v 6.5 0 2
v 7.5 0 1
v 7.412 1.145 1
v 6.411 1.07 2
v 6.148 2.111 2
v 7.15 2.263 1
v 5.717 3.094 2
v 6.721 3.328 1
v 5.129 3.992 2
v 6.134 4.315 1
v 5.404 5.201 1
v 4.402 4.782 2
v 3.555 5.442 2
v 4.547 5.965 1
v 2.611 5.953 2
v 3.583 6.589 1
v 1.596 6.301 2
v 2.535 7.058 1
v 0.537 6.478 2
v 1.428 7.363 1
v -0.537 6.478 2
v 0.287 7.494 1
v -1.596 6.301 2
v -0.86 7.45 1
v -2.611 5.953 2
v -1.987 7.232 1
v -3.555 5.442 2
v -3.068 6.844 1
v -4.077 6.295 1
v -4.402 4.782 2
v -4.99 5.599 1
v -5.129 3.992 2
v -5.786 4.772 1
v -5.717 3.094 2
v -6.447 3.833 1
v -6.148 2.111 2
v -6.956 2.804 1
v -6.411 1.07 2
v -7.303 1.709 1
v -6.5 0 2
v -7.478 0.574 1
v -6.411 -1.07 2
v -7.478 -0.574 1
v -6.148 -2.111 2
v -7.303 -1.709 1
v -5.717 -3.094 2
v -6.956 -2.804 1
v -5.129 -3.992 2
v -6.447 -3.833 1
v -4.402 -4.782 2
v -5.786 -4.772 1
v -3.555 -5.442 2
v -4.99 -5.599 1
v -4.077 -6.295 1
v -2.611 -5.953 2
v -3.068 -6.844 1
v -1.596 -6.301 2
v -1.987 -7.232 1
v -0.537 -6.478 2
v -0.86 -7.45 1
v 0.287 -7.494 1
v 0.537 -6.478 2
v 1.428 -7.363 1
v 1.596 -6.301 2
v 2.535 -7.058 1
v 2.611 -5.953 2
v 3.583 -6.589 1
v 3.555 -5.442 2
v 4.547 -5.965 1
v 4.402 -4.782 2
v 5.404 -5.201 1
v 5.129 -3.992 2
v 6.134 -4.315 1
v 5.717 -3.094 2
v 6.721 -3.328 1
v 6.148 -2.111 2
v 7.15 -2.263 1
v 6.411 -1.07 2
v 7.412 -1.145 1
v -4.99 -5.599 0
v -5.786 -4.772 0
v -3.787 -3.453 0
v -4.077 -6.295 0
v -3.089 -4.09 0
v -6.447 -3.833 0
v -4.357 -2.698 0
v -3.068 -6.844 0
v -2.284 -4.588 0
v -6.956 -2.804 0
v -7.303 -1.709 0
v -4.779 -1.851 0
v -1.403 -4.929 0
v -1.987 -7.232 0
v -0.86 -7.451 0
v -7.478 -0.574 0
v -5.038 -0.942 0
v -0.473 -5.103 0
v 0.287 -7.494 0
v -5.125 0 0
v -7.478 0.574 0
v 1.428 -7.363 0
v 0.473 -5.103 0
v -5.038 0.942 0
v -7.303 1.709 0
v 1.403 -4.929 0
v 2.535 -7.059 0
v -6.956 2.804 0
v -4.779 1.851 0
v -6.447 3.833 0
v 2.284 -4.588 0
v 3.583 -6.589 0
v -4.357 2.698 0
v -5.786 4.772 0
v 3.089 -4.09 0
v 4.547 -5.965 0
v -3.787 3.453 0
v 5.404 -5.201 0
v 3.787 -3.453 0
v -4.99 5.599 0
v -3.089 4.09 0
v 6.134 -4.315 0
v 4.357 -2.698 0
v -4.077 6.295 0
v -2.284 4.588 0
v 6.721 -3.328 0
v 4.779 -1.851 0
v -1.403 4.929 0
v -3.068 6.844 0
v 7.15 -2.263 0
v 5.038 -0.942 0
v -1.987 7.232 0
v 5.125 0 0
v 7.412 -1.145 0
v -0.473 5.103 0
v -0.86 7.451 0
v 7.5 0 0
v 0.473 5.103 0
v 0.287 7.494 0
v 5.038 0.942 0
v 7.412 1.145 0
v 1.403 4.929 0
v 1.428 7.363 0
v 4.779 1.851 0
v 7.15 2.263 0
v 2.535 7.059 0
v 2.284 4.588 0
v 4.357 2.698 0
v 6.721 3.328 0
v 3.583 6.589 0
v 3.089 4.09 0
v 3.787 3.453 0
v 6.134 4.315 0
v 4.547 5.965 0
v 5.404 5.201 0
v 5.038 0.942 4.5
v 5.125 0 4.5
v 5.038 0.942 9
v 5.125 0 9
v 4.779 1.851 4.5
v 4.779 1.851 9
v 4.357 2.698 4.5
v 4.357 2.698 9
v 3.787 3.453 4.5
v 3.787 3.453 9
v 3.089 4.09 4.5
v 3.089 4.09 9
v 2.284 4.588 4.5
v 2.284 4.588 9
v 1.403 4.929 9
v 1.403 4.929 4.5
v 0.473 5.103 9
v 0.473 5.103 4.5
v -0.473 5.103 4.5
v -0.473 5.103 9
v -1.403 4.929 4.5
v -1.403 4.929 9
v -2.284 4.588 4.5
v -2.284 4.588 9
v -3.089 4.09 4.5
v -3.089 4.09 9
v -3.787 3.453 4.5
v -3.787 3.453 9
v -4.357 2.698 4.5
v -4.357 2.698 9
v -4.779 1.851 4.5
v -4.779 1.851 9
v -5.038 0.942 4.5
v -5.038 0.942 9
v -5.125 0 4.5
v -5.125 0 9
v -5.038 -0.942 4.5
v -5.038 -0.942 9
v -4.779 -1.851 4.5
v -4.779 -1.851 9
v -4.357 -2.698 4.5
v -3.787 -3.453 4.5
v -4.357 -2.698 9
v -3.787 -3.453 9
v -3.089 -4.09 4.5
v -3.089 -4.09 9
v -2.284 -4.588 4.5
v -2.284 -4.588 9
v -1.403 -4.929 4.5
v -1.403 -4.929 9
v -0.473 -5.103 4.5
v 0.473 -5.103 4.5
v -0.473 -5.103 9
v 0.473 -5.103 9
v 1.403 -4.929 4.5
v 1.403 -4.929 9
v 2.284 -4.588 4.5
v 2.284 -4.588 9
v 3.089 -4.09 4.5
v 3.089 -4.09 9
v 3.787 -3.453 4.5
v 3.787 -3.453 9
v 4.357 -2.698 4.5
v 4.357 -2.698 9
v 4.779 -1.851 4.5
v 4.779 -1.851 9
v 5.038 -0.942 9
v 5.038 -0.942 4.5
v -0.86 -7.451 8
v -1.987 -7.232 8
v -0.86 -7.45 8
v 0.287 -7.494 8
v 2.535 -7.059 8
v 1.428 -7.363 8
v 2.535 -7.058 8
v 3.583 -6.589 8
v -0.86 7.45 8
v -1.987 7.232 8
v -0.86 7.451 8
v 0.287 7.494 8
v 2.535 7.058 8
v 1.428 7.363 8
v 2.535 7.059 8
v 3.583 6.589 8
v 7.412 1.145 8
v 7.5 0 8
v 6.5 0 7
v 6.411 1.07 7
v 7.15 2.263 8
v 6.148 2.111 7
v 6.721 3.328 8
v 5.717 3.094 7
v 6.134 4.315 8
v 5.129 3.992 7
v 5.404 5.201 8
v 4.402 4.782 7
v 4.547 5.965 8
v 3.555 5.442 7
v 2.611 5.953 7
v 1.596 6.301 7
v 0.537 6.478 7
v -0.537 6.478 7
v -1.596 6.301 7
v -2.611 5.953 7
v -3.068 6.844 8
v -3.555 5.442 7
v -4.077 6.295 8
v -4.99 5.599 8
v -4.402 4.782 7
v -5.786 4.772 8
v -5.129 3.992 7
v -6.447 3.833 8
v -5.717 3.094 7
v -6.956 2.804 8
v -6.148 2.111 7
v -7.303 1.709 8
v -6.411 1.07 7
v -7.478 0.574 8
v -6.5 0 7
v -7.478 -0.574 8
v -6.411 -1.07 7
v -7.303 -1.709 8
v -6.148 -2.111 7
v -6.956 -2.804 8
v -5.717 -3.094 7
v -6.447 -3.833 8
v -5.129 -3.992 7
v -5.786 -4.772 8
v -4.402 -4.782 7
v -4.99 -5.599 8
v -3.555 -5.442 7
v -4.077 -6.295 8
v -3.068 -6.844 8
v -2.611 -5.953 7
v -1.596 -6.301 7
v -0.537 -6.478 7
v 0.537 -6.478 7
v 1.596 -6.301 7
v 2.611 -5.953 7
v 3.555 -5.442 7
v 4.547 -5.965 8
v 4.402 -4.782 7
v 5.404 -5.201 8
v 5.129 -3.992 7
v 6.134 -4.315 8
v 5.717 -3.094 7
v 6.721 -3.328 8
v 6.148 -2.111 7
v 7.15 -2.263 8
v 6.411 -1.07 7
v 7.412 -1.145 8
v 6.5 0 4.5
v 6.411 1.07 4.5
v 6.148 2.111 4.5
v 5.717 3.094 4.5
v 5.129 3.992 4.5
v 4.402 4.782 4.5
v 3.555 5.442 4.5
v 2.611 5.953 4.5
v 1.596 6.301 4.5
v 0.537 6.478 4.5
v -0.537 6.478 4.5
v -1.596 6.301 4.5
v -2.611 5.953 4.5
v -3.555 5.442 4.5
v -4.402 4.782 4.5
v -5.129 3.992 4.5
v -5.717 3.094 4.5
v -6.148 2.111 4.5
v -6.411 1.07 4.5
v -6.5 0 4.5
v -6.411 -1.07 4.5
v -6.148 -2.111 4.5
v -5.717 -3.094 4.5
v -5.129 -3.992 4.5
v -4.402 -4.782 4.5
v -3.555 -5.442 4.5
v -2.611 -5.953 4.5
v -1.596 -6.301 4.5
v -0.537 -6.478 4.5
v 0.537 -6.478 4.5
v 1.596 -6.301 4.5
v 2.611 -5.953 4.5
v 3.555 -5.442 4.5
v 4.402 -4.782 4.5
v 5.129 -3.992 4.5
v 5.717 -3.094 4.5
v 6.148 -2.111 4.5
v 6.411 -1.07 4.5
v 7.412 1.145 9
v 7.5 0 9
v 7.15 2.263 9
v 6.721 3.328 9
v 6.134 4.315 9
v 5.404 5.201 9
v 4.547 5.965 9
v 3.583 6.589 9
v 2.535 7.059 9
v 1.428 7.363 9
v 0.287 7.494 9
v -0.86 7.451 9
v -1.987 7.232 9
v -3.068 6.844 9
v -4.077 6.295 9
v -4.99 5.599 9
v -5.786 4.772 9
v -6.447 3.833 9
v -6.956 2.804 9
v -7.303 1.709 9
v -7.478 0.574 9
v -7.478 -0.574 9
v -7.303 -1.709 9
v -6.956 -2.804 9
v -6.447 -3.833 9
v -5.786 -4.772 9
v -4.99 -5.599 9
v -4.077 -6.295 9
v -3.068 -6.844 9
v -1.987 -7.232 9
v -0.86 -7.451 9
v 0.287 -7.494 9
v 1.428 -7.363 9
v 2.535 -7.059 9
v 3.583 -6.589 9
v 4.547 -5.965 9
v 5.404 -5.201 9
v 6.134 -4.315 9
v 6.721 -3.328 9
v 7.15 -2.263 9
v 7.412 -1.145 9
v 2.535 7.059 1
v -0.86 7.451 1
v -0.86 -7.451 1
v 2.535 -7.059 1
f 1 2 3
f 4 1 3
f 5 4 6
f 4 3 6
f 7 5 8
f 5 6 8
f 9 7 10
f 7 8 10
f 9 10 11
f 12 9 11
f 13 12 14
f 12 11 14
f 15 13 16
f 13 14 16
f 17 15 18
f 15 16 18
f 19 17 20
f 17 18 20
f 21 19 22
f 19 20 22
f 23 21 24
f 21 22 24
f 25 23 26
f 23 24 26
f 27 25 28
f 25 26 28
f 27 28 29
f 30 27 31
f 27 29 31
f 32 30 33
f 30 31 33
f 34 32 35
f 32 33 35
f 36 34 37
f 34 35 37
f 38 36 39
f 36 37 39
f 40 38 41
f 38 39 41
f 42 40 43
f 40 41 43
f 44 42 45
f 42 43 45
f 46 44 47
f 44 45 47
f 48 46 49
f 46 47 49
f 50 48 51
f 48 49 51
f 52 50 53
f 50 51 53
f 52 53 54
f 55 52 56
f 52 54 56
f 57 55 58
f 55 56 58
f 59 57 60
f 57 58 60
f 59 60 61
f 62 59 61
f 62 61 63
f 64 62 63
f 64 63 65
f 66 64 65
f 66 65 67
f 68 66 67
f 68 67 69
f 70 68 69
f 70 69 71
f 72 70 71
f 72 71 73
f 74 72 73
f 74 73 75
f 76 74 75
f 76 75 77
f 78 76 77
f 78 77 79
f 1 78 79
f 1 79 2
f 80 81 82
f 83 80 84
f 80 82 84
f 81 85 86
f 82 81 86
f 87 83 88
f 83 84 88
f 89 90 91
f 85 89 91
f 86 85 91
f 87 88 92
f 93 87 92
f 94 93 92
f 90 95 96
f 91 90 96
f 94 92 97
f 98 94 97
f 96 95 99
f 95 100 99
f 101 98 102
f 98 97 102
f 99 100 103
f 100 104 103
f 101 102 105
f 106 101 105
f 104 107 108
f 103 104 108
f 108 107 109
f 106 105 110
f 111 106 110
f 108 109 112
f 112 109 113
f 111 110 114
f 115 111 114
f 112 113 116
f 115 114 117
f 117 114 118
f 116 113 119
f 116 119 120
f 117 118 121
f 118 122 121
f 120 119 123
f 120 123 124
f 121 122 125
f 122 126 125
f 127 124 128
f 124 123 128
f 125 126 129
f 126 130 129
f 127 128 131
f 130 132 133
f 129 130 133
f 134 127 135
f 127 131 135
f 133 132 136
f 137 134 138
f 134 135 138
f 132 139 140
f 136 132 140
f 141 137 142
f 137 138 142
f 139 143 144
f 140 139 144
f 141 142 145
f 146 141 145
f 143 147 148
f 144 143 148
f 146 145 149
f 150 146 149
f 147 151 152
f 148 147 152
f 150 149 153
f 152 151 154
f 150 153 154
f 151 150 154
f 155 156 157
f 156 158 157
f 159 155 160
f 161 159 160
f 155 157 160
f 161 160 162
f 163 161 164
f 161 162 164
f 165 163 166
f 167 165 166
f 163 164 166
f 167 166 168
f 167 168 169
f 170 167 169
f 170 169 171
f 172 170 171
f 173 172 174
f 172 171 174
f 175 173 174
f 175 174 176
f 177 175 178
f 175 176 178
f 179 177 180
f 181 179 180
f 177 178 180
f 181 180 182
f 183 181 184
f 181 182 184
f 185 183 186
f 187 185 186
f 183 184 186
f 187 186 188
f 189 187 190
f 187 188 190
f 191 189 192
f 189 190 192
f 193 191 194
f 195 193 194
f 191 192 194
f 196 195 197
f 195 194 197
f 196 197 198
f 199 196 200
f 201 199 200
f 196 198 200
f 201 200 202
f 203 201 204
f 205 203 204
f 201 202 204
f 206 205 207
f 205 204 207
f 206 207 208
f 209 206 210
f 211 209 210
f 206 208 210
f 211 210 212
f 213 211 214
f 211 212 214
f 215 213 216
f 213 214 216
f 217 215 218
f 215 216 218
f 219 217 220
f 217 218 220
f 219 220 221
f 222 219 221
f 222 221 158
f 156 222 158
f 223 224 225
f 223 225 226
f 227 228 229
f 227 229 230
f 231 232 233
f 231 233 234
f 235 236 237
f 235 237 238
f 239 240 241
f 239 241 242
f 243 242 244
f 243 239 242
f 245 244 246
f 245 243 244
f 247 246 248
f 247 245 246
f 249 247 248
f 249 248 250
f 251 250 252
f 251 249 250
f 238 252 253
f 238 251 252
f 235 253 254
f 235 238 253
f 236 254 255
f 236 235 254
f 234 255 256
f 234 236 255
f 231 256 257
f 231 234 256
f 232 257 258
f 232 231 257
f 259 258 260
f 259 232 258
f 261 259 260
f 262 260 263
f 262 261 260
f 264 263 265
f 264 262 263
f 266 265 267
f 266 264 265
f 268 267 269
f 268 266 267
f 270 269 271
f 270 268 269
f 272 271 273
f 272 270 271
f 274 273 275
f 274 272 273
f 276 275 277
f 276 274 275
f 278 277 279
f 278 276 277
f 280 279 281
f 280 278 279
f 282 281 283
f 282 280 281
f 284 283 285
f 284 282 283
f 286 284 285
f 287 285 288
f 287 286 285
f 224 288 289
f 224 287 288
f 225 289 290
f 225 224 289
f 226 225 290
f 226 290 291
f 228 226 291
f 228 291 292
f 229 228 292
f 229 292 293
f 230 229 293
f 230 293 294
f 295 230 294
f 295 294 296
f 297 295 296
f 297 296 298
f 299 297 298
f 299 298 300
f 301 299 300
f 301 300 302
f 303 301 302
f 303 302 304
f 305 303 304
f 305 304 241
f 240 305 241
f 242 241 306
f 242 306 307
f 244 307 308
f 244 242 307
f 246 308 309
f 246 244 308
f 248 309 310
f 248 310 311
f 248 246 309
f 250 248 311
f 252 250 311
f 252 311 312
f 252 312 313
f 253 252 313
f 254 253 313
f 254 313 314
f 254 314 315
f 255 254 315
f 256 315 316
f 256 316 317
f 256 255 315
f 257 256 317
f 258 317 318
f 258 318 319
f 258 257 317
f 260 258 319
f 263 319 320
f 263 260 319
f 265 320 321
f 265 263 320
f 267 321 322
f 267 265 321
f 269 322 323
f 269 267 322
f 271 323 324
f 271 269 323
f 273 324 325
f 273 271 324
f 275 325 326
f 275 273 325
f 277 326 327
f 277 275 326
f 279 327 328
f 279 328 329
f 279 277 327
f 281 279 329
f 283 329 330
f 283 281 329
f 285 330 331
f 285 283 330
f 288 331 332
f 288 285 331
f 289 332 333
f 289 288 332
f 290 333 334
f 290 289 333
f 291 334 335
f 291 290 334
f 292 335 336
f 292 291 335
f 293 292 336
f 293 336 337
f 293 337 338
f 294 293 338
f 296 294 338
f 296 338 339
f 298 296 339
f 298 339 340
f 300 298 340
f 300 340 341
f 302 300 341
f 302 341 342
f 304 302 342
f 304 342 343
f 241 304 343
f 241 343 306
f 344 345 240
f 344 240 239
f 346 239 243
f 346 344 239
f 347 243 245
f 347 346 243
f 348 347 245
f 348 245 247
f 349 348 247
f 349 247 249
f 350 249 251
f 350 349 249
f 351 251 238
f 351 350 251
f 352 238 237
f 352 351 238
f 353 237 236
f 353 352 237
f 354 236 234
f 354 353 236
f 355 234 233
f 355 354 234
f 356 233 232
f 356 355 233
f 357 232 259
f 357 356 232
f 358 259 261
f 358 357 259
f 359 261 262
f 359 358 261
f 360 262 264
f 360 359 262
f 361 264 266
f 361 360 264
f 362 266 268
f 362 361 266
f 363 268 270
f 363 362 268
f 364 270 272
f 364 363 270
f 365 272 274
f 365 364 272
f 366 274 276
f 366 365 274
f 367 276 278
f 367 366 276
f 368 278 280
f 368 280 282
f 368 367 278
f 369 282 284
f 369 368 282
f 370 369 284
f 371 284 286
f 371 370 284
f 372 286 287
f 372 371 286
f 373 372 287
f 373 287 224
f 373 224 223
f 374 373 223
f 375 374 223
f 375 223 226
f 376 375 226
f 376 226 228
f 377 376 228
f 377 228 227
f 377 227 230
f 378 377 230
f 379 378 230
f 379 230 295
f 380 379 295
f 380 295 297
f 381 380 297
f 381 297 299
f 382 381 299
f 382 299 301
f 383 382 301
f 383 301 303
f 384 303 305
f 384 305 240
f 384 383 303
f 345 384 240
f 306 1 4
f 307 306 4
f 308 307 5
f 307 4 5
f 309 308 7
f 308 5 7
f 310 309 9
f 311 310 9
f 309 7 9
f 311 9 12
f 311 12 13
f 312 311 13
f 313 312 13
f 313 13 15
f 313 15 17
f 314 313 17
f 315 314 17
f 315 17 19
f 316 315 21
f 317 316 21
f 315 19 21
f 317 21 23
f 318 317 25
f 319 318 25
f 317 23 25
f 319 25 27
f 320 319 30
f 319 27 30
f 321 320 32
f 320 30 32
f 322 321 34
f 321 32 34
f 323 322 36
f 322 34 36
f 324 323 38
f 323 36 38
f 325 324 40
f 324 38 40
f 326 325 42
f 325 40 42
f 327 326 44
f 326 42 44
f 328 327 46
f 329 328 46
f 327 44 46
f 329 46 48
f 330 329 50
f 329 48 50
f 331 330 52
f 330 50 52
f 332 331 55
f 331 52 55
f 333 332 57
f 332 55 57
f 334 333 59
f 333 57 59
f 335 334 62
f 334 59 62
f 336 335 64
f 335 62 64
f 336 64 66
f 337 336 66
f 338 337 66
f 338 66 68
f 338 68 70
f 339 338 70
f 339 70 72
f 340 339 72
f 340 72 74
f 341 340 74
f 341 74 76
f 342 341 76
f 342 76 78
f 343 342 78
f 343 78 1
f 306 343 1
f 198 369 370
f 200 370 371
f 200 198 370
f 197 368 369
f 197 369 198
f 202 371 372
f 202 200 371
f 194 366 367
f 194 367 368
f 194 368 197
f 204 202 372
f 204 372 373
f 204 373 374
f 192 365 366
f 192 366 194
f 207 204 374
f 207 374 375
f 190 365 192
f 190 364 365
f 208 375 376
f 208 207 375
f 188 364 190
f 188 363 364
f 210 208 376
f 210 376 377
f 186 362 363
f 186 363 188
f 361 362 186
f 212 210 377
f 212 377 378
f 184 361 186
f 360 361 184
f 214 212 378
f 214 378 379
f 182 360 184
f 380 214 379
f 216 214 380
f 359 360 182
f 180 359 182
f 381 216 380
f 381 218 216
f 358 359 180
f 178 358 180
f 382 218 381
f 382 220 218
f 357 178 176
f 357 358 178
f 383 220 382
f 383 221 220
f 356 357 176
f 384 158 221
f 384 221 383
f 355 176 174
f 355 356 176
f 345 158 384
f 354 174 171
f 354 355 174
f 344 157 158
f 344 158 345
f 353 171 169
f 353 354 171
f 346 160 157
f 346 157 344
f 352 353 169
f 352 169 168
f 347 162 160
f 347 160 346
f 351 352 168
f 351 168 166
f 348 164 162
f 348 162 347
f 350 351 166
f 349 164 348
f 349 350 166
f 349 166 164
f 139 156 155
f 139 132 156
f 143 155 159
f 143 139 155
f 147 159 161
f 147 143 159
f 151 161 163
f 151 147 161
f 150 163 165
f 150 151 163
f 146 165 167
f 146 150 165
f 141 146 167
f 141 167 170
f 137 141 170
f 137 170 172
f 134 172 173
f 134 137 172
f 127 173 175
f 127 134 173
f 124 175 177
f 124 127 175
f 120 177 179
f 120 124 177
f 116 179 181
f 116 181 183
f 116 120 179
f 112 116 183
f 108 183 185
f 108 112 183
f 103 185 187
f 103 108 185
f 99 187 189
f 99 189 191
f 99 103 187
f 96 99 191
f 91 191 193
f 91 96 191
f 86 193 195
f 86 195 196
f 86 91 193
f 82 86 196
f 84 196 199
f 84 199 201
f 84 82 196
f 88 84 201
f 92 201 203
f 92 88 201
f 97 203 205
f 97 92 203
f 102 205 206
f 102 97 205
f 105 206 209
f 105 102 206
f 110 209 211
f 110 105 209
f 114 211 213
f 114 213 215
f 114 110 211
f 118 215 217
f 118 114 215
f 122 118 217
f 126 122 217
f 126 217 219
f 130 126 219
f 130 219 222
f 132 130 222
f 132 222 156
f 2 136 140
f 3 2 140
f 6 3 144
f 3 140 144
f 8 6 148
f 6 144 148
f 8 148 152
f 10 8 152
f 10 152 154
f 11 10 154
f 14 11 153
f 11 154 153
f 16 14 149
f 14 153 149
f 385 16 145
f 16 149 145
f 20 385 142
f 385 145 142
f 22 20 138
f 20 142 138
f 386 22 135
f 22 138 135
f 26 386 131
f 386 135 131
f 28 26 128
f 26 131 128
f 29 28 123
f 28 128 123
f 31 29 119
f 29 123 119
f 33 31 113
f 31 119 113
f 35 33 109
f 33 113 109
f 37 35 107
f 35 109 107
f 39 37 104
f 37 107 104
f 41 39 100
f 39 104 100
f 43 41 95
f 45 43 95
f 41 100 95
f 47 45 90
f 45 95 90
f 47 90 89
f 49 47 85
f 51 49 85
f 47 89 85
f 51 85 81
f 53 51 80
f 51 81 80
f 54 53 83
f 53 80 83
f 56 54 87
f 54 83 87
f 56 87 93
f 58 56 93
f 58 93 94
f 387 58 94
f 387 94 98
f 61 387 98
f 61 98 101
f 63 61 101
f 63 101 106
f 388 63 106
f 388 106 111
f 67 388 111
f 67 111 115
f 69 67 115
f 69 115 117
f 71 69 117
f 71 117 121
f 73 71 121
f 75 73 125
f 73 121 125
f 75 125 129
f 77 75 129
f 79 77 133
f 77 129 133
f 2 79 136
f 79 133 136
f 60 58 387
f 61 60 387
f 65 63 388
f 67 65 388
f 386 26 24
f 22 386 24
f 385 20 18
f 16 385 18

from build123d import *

# Parameters (mm, degrees)
SKETCH1_R           = 7.5
SKETCH1_R_2         = 5.125
BOSS_EXTRUDE1_DEPTH = 1
SKETCH2_R           = 6.5
SKETCH2_R_2         = 5.125
BOSS_EXTRUDE2_DEPTH = 3.5
CHAMFER1_SIZE       = 1


with BuildPart() as part:
    # Sketch1 → Boss-Extrude1 (new body)
    with BuildSketch(Plane.XY):
        Circle(SKETCH1_R)
        Circle(SKETCH1_R_2, mode=Mode.SUBTRACT)
    extrude(amount=BOSS_EXTRUDE1_DEPTH)

    # Sketch2 → Boss-Extrude2 (add)
    with BuildSketch(Plane.XY.offset(1)):
        Circle(SKETCH2_R)
        Circle(SKETCH2_R_2, mode=Mode.SUBTRACT)
    extrude(amount=BOSS_EXTRUDE2_DEPTH)

    # Chamfer1
    chamfer1_edges = [part.edges().sort_by_distance(p)[0] for p in [
        (-6.5, 0, 1),
    ]]
    chamfer(chamfer1_edges, length=CHAMFER1_SIZE - 0.0001)  # a hair under: the kernel refuses the full size

    # Mirror5: part across plane


with BuildPart() as part_1:
    add(part.part)
    add(part.part.mirror(Plane.XY.offset(4.5)))


solid = part_1.part
